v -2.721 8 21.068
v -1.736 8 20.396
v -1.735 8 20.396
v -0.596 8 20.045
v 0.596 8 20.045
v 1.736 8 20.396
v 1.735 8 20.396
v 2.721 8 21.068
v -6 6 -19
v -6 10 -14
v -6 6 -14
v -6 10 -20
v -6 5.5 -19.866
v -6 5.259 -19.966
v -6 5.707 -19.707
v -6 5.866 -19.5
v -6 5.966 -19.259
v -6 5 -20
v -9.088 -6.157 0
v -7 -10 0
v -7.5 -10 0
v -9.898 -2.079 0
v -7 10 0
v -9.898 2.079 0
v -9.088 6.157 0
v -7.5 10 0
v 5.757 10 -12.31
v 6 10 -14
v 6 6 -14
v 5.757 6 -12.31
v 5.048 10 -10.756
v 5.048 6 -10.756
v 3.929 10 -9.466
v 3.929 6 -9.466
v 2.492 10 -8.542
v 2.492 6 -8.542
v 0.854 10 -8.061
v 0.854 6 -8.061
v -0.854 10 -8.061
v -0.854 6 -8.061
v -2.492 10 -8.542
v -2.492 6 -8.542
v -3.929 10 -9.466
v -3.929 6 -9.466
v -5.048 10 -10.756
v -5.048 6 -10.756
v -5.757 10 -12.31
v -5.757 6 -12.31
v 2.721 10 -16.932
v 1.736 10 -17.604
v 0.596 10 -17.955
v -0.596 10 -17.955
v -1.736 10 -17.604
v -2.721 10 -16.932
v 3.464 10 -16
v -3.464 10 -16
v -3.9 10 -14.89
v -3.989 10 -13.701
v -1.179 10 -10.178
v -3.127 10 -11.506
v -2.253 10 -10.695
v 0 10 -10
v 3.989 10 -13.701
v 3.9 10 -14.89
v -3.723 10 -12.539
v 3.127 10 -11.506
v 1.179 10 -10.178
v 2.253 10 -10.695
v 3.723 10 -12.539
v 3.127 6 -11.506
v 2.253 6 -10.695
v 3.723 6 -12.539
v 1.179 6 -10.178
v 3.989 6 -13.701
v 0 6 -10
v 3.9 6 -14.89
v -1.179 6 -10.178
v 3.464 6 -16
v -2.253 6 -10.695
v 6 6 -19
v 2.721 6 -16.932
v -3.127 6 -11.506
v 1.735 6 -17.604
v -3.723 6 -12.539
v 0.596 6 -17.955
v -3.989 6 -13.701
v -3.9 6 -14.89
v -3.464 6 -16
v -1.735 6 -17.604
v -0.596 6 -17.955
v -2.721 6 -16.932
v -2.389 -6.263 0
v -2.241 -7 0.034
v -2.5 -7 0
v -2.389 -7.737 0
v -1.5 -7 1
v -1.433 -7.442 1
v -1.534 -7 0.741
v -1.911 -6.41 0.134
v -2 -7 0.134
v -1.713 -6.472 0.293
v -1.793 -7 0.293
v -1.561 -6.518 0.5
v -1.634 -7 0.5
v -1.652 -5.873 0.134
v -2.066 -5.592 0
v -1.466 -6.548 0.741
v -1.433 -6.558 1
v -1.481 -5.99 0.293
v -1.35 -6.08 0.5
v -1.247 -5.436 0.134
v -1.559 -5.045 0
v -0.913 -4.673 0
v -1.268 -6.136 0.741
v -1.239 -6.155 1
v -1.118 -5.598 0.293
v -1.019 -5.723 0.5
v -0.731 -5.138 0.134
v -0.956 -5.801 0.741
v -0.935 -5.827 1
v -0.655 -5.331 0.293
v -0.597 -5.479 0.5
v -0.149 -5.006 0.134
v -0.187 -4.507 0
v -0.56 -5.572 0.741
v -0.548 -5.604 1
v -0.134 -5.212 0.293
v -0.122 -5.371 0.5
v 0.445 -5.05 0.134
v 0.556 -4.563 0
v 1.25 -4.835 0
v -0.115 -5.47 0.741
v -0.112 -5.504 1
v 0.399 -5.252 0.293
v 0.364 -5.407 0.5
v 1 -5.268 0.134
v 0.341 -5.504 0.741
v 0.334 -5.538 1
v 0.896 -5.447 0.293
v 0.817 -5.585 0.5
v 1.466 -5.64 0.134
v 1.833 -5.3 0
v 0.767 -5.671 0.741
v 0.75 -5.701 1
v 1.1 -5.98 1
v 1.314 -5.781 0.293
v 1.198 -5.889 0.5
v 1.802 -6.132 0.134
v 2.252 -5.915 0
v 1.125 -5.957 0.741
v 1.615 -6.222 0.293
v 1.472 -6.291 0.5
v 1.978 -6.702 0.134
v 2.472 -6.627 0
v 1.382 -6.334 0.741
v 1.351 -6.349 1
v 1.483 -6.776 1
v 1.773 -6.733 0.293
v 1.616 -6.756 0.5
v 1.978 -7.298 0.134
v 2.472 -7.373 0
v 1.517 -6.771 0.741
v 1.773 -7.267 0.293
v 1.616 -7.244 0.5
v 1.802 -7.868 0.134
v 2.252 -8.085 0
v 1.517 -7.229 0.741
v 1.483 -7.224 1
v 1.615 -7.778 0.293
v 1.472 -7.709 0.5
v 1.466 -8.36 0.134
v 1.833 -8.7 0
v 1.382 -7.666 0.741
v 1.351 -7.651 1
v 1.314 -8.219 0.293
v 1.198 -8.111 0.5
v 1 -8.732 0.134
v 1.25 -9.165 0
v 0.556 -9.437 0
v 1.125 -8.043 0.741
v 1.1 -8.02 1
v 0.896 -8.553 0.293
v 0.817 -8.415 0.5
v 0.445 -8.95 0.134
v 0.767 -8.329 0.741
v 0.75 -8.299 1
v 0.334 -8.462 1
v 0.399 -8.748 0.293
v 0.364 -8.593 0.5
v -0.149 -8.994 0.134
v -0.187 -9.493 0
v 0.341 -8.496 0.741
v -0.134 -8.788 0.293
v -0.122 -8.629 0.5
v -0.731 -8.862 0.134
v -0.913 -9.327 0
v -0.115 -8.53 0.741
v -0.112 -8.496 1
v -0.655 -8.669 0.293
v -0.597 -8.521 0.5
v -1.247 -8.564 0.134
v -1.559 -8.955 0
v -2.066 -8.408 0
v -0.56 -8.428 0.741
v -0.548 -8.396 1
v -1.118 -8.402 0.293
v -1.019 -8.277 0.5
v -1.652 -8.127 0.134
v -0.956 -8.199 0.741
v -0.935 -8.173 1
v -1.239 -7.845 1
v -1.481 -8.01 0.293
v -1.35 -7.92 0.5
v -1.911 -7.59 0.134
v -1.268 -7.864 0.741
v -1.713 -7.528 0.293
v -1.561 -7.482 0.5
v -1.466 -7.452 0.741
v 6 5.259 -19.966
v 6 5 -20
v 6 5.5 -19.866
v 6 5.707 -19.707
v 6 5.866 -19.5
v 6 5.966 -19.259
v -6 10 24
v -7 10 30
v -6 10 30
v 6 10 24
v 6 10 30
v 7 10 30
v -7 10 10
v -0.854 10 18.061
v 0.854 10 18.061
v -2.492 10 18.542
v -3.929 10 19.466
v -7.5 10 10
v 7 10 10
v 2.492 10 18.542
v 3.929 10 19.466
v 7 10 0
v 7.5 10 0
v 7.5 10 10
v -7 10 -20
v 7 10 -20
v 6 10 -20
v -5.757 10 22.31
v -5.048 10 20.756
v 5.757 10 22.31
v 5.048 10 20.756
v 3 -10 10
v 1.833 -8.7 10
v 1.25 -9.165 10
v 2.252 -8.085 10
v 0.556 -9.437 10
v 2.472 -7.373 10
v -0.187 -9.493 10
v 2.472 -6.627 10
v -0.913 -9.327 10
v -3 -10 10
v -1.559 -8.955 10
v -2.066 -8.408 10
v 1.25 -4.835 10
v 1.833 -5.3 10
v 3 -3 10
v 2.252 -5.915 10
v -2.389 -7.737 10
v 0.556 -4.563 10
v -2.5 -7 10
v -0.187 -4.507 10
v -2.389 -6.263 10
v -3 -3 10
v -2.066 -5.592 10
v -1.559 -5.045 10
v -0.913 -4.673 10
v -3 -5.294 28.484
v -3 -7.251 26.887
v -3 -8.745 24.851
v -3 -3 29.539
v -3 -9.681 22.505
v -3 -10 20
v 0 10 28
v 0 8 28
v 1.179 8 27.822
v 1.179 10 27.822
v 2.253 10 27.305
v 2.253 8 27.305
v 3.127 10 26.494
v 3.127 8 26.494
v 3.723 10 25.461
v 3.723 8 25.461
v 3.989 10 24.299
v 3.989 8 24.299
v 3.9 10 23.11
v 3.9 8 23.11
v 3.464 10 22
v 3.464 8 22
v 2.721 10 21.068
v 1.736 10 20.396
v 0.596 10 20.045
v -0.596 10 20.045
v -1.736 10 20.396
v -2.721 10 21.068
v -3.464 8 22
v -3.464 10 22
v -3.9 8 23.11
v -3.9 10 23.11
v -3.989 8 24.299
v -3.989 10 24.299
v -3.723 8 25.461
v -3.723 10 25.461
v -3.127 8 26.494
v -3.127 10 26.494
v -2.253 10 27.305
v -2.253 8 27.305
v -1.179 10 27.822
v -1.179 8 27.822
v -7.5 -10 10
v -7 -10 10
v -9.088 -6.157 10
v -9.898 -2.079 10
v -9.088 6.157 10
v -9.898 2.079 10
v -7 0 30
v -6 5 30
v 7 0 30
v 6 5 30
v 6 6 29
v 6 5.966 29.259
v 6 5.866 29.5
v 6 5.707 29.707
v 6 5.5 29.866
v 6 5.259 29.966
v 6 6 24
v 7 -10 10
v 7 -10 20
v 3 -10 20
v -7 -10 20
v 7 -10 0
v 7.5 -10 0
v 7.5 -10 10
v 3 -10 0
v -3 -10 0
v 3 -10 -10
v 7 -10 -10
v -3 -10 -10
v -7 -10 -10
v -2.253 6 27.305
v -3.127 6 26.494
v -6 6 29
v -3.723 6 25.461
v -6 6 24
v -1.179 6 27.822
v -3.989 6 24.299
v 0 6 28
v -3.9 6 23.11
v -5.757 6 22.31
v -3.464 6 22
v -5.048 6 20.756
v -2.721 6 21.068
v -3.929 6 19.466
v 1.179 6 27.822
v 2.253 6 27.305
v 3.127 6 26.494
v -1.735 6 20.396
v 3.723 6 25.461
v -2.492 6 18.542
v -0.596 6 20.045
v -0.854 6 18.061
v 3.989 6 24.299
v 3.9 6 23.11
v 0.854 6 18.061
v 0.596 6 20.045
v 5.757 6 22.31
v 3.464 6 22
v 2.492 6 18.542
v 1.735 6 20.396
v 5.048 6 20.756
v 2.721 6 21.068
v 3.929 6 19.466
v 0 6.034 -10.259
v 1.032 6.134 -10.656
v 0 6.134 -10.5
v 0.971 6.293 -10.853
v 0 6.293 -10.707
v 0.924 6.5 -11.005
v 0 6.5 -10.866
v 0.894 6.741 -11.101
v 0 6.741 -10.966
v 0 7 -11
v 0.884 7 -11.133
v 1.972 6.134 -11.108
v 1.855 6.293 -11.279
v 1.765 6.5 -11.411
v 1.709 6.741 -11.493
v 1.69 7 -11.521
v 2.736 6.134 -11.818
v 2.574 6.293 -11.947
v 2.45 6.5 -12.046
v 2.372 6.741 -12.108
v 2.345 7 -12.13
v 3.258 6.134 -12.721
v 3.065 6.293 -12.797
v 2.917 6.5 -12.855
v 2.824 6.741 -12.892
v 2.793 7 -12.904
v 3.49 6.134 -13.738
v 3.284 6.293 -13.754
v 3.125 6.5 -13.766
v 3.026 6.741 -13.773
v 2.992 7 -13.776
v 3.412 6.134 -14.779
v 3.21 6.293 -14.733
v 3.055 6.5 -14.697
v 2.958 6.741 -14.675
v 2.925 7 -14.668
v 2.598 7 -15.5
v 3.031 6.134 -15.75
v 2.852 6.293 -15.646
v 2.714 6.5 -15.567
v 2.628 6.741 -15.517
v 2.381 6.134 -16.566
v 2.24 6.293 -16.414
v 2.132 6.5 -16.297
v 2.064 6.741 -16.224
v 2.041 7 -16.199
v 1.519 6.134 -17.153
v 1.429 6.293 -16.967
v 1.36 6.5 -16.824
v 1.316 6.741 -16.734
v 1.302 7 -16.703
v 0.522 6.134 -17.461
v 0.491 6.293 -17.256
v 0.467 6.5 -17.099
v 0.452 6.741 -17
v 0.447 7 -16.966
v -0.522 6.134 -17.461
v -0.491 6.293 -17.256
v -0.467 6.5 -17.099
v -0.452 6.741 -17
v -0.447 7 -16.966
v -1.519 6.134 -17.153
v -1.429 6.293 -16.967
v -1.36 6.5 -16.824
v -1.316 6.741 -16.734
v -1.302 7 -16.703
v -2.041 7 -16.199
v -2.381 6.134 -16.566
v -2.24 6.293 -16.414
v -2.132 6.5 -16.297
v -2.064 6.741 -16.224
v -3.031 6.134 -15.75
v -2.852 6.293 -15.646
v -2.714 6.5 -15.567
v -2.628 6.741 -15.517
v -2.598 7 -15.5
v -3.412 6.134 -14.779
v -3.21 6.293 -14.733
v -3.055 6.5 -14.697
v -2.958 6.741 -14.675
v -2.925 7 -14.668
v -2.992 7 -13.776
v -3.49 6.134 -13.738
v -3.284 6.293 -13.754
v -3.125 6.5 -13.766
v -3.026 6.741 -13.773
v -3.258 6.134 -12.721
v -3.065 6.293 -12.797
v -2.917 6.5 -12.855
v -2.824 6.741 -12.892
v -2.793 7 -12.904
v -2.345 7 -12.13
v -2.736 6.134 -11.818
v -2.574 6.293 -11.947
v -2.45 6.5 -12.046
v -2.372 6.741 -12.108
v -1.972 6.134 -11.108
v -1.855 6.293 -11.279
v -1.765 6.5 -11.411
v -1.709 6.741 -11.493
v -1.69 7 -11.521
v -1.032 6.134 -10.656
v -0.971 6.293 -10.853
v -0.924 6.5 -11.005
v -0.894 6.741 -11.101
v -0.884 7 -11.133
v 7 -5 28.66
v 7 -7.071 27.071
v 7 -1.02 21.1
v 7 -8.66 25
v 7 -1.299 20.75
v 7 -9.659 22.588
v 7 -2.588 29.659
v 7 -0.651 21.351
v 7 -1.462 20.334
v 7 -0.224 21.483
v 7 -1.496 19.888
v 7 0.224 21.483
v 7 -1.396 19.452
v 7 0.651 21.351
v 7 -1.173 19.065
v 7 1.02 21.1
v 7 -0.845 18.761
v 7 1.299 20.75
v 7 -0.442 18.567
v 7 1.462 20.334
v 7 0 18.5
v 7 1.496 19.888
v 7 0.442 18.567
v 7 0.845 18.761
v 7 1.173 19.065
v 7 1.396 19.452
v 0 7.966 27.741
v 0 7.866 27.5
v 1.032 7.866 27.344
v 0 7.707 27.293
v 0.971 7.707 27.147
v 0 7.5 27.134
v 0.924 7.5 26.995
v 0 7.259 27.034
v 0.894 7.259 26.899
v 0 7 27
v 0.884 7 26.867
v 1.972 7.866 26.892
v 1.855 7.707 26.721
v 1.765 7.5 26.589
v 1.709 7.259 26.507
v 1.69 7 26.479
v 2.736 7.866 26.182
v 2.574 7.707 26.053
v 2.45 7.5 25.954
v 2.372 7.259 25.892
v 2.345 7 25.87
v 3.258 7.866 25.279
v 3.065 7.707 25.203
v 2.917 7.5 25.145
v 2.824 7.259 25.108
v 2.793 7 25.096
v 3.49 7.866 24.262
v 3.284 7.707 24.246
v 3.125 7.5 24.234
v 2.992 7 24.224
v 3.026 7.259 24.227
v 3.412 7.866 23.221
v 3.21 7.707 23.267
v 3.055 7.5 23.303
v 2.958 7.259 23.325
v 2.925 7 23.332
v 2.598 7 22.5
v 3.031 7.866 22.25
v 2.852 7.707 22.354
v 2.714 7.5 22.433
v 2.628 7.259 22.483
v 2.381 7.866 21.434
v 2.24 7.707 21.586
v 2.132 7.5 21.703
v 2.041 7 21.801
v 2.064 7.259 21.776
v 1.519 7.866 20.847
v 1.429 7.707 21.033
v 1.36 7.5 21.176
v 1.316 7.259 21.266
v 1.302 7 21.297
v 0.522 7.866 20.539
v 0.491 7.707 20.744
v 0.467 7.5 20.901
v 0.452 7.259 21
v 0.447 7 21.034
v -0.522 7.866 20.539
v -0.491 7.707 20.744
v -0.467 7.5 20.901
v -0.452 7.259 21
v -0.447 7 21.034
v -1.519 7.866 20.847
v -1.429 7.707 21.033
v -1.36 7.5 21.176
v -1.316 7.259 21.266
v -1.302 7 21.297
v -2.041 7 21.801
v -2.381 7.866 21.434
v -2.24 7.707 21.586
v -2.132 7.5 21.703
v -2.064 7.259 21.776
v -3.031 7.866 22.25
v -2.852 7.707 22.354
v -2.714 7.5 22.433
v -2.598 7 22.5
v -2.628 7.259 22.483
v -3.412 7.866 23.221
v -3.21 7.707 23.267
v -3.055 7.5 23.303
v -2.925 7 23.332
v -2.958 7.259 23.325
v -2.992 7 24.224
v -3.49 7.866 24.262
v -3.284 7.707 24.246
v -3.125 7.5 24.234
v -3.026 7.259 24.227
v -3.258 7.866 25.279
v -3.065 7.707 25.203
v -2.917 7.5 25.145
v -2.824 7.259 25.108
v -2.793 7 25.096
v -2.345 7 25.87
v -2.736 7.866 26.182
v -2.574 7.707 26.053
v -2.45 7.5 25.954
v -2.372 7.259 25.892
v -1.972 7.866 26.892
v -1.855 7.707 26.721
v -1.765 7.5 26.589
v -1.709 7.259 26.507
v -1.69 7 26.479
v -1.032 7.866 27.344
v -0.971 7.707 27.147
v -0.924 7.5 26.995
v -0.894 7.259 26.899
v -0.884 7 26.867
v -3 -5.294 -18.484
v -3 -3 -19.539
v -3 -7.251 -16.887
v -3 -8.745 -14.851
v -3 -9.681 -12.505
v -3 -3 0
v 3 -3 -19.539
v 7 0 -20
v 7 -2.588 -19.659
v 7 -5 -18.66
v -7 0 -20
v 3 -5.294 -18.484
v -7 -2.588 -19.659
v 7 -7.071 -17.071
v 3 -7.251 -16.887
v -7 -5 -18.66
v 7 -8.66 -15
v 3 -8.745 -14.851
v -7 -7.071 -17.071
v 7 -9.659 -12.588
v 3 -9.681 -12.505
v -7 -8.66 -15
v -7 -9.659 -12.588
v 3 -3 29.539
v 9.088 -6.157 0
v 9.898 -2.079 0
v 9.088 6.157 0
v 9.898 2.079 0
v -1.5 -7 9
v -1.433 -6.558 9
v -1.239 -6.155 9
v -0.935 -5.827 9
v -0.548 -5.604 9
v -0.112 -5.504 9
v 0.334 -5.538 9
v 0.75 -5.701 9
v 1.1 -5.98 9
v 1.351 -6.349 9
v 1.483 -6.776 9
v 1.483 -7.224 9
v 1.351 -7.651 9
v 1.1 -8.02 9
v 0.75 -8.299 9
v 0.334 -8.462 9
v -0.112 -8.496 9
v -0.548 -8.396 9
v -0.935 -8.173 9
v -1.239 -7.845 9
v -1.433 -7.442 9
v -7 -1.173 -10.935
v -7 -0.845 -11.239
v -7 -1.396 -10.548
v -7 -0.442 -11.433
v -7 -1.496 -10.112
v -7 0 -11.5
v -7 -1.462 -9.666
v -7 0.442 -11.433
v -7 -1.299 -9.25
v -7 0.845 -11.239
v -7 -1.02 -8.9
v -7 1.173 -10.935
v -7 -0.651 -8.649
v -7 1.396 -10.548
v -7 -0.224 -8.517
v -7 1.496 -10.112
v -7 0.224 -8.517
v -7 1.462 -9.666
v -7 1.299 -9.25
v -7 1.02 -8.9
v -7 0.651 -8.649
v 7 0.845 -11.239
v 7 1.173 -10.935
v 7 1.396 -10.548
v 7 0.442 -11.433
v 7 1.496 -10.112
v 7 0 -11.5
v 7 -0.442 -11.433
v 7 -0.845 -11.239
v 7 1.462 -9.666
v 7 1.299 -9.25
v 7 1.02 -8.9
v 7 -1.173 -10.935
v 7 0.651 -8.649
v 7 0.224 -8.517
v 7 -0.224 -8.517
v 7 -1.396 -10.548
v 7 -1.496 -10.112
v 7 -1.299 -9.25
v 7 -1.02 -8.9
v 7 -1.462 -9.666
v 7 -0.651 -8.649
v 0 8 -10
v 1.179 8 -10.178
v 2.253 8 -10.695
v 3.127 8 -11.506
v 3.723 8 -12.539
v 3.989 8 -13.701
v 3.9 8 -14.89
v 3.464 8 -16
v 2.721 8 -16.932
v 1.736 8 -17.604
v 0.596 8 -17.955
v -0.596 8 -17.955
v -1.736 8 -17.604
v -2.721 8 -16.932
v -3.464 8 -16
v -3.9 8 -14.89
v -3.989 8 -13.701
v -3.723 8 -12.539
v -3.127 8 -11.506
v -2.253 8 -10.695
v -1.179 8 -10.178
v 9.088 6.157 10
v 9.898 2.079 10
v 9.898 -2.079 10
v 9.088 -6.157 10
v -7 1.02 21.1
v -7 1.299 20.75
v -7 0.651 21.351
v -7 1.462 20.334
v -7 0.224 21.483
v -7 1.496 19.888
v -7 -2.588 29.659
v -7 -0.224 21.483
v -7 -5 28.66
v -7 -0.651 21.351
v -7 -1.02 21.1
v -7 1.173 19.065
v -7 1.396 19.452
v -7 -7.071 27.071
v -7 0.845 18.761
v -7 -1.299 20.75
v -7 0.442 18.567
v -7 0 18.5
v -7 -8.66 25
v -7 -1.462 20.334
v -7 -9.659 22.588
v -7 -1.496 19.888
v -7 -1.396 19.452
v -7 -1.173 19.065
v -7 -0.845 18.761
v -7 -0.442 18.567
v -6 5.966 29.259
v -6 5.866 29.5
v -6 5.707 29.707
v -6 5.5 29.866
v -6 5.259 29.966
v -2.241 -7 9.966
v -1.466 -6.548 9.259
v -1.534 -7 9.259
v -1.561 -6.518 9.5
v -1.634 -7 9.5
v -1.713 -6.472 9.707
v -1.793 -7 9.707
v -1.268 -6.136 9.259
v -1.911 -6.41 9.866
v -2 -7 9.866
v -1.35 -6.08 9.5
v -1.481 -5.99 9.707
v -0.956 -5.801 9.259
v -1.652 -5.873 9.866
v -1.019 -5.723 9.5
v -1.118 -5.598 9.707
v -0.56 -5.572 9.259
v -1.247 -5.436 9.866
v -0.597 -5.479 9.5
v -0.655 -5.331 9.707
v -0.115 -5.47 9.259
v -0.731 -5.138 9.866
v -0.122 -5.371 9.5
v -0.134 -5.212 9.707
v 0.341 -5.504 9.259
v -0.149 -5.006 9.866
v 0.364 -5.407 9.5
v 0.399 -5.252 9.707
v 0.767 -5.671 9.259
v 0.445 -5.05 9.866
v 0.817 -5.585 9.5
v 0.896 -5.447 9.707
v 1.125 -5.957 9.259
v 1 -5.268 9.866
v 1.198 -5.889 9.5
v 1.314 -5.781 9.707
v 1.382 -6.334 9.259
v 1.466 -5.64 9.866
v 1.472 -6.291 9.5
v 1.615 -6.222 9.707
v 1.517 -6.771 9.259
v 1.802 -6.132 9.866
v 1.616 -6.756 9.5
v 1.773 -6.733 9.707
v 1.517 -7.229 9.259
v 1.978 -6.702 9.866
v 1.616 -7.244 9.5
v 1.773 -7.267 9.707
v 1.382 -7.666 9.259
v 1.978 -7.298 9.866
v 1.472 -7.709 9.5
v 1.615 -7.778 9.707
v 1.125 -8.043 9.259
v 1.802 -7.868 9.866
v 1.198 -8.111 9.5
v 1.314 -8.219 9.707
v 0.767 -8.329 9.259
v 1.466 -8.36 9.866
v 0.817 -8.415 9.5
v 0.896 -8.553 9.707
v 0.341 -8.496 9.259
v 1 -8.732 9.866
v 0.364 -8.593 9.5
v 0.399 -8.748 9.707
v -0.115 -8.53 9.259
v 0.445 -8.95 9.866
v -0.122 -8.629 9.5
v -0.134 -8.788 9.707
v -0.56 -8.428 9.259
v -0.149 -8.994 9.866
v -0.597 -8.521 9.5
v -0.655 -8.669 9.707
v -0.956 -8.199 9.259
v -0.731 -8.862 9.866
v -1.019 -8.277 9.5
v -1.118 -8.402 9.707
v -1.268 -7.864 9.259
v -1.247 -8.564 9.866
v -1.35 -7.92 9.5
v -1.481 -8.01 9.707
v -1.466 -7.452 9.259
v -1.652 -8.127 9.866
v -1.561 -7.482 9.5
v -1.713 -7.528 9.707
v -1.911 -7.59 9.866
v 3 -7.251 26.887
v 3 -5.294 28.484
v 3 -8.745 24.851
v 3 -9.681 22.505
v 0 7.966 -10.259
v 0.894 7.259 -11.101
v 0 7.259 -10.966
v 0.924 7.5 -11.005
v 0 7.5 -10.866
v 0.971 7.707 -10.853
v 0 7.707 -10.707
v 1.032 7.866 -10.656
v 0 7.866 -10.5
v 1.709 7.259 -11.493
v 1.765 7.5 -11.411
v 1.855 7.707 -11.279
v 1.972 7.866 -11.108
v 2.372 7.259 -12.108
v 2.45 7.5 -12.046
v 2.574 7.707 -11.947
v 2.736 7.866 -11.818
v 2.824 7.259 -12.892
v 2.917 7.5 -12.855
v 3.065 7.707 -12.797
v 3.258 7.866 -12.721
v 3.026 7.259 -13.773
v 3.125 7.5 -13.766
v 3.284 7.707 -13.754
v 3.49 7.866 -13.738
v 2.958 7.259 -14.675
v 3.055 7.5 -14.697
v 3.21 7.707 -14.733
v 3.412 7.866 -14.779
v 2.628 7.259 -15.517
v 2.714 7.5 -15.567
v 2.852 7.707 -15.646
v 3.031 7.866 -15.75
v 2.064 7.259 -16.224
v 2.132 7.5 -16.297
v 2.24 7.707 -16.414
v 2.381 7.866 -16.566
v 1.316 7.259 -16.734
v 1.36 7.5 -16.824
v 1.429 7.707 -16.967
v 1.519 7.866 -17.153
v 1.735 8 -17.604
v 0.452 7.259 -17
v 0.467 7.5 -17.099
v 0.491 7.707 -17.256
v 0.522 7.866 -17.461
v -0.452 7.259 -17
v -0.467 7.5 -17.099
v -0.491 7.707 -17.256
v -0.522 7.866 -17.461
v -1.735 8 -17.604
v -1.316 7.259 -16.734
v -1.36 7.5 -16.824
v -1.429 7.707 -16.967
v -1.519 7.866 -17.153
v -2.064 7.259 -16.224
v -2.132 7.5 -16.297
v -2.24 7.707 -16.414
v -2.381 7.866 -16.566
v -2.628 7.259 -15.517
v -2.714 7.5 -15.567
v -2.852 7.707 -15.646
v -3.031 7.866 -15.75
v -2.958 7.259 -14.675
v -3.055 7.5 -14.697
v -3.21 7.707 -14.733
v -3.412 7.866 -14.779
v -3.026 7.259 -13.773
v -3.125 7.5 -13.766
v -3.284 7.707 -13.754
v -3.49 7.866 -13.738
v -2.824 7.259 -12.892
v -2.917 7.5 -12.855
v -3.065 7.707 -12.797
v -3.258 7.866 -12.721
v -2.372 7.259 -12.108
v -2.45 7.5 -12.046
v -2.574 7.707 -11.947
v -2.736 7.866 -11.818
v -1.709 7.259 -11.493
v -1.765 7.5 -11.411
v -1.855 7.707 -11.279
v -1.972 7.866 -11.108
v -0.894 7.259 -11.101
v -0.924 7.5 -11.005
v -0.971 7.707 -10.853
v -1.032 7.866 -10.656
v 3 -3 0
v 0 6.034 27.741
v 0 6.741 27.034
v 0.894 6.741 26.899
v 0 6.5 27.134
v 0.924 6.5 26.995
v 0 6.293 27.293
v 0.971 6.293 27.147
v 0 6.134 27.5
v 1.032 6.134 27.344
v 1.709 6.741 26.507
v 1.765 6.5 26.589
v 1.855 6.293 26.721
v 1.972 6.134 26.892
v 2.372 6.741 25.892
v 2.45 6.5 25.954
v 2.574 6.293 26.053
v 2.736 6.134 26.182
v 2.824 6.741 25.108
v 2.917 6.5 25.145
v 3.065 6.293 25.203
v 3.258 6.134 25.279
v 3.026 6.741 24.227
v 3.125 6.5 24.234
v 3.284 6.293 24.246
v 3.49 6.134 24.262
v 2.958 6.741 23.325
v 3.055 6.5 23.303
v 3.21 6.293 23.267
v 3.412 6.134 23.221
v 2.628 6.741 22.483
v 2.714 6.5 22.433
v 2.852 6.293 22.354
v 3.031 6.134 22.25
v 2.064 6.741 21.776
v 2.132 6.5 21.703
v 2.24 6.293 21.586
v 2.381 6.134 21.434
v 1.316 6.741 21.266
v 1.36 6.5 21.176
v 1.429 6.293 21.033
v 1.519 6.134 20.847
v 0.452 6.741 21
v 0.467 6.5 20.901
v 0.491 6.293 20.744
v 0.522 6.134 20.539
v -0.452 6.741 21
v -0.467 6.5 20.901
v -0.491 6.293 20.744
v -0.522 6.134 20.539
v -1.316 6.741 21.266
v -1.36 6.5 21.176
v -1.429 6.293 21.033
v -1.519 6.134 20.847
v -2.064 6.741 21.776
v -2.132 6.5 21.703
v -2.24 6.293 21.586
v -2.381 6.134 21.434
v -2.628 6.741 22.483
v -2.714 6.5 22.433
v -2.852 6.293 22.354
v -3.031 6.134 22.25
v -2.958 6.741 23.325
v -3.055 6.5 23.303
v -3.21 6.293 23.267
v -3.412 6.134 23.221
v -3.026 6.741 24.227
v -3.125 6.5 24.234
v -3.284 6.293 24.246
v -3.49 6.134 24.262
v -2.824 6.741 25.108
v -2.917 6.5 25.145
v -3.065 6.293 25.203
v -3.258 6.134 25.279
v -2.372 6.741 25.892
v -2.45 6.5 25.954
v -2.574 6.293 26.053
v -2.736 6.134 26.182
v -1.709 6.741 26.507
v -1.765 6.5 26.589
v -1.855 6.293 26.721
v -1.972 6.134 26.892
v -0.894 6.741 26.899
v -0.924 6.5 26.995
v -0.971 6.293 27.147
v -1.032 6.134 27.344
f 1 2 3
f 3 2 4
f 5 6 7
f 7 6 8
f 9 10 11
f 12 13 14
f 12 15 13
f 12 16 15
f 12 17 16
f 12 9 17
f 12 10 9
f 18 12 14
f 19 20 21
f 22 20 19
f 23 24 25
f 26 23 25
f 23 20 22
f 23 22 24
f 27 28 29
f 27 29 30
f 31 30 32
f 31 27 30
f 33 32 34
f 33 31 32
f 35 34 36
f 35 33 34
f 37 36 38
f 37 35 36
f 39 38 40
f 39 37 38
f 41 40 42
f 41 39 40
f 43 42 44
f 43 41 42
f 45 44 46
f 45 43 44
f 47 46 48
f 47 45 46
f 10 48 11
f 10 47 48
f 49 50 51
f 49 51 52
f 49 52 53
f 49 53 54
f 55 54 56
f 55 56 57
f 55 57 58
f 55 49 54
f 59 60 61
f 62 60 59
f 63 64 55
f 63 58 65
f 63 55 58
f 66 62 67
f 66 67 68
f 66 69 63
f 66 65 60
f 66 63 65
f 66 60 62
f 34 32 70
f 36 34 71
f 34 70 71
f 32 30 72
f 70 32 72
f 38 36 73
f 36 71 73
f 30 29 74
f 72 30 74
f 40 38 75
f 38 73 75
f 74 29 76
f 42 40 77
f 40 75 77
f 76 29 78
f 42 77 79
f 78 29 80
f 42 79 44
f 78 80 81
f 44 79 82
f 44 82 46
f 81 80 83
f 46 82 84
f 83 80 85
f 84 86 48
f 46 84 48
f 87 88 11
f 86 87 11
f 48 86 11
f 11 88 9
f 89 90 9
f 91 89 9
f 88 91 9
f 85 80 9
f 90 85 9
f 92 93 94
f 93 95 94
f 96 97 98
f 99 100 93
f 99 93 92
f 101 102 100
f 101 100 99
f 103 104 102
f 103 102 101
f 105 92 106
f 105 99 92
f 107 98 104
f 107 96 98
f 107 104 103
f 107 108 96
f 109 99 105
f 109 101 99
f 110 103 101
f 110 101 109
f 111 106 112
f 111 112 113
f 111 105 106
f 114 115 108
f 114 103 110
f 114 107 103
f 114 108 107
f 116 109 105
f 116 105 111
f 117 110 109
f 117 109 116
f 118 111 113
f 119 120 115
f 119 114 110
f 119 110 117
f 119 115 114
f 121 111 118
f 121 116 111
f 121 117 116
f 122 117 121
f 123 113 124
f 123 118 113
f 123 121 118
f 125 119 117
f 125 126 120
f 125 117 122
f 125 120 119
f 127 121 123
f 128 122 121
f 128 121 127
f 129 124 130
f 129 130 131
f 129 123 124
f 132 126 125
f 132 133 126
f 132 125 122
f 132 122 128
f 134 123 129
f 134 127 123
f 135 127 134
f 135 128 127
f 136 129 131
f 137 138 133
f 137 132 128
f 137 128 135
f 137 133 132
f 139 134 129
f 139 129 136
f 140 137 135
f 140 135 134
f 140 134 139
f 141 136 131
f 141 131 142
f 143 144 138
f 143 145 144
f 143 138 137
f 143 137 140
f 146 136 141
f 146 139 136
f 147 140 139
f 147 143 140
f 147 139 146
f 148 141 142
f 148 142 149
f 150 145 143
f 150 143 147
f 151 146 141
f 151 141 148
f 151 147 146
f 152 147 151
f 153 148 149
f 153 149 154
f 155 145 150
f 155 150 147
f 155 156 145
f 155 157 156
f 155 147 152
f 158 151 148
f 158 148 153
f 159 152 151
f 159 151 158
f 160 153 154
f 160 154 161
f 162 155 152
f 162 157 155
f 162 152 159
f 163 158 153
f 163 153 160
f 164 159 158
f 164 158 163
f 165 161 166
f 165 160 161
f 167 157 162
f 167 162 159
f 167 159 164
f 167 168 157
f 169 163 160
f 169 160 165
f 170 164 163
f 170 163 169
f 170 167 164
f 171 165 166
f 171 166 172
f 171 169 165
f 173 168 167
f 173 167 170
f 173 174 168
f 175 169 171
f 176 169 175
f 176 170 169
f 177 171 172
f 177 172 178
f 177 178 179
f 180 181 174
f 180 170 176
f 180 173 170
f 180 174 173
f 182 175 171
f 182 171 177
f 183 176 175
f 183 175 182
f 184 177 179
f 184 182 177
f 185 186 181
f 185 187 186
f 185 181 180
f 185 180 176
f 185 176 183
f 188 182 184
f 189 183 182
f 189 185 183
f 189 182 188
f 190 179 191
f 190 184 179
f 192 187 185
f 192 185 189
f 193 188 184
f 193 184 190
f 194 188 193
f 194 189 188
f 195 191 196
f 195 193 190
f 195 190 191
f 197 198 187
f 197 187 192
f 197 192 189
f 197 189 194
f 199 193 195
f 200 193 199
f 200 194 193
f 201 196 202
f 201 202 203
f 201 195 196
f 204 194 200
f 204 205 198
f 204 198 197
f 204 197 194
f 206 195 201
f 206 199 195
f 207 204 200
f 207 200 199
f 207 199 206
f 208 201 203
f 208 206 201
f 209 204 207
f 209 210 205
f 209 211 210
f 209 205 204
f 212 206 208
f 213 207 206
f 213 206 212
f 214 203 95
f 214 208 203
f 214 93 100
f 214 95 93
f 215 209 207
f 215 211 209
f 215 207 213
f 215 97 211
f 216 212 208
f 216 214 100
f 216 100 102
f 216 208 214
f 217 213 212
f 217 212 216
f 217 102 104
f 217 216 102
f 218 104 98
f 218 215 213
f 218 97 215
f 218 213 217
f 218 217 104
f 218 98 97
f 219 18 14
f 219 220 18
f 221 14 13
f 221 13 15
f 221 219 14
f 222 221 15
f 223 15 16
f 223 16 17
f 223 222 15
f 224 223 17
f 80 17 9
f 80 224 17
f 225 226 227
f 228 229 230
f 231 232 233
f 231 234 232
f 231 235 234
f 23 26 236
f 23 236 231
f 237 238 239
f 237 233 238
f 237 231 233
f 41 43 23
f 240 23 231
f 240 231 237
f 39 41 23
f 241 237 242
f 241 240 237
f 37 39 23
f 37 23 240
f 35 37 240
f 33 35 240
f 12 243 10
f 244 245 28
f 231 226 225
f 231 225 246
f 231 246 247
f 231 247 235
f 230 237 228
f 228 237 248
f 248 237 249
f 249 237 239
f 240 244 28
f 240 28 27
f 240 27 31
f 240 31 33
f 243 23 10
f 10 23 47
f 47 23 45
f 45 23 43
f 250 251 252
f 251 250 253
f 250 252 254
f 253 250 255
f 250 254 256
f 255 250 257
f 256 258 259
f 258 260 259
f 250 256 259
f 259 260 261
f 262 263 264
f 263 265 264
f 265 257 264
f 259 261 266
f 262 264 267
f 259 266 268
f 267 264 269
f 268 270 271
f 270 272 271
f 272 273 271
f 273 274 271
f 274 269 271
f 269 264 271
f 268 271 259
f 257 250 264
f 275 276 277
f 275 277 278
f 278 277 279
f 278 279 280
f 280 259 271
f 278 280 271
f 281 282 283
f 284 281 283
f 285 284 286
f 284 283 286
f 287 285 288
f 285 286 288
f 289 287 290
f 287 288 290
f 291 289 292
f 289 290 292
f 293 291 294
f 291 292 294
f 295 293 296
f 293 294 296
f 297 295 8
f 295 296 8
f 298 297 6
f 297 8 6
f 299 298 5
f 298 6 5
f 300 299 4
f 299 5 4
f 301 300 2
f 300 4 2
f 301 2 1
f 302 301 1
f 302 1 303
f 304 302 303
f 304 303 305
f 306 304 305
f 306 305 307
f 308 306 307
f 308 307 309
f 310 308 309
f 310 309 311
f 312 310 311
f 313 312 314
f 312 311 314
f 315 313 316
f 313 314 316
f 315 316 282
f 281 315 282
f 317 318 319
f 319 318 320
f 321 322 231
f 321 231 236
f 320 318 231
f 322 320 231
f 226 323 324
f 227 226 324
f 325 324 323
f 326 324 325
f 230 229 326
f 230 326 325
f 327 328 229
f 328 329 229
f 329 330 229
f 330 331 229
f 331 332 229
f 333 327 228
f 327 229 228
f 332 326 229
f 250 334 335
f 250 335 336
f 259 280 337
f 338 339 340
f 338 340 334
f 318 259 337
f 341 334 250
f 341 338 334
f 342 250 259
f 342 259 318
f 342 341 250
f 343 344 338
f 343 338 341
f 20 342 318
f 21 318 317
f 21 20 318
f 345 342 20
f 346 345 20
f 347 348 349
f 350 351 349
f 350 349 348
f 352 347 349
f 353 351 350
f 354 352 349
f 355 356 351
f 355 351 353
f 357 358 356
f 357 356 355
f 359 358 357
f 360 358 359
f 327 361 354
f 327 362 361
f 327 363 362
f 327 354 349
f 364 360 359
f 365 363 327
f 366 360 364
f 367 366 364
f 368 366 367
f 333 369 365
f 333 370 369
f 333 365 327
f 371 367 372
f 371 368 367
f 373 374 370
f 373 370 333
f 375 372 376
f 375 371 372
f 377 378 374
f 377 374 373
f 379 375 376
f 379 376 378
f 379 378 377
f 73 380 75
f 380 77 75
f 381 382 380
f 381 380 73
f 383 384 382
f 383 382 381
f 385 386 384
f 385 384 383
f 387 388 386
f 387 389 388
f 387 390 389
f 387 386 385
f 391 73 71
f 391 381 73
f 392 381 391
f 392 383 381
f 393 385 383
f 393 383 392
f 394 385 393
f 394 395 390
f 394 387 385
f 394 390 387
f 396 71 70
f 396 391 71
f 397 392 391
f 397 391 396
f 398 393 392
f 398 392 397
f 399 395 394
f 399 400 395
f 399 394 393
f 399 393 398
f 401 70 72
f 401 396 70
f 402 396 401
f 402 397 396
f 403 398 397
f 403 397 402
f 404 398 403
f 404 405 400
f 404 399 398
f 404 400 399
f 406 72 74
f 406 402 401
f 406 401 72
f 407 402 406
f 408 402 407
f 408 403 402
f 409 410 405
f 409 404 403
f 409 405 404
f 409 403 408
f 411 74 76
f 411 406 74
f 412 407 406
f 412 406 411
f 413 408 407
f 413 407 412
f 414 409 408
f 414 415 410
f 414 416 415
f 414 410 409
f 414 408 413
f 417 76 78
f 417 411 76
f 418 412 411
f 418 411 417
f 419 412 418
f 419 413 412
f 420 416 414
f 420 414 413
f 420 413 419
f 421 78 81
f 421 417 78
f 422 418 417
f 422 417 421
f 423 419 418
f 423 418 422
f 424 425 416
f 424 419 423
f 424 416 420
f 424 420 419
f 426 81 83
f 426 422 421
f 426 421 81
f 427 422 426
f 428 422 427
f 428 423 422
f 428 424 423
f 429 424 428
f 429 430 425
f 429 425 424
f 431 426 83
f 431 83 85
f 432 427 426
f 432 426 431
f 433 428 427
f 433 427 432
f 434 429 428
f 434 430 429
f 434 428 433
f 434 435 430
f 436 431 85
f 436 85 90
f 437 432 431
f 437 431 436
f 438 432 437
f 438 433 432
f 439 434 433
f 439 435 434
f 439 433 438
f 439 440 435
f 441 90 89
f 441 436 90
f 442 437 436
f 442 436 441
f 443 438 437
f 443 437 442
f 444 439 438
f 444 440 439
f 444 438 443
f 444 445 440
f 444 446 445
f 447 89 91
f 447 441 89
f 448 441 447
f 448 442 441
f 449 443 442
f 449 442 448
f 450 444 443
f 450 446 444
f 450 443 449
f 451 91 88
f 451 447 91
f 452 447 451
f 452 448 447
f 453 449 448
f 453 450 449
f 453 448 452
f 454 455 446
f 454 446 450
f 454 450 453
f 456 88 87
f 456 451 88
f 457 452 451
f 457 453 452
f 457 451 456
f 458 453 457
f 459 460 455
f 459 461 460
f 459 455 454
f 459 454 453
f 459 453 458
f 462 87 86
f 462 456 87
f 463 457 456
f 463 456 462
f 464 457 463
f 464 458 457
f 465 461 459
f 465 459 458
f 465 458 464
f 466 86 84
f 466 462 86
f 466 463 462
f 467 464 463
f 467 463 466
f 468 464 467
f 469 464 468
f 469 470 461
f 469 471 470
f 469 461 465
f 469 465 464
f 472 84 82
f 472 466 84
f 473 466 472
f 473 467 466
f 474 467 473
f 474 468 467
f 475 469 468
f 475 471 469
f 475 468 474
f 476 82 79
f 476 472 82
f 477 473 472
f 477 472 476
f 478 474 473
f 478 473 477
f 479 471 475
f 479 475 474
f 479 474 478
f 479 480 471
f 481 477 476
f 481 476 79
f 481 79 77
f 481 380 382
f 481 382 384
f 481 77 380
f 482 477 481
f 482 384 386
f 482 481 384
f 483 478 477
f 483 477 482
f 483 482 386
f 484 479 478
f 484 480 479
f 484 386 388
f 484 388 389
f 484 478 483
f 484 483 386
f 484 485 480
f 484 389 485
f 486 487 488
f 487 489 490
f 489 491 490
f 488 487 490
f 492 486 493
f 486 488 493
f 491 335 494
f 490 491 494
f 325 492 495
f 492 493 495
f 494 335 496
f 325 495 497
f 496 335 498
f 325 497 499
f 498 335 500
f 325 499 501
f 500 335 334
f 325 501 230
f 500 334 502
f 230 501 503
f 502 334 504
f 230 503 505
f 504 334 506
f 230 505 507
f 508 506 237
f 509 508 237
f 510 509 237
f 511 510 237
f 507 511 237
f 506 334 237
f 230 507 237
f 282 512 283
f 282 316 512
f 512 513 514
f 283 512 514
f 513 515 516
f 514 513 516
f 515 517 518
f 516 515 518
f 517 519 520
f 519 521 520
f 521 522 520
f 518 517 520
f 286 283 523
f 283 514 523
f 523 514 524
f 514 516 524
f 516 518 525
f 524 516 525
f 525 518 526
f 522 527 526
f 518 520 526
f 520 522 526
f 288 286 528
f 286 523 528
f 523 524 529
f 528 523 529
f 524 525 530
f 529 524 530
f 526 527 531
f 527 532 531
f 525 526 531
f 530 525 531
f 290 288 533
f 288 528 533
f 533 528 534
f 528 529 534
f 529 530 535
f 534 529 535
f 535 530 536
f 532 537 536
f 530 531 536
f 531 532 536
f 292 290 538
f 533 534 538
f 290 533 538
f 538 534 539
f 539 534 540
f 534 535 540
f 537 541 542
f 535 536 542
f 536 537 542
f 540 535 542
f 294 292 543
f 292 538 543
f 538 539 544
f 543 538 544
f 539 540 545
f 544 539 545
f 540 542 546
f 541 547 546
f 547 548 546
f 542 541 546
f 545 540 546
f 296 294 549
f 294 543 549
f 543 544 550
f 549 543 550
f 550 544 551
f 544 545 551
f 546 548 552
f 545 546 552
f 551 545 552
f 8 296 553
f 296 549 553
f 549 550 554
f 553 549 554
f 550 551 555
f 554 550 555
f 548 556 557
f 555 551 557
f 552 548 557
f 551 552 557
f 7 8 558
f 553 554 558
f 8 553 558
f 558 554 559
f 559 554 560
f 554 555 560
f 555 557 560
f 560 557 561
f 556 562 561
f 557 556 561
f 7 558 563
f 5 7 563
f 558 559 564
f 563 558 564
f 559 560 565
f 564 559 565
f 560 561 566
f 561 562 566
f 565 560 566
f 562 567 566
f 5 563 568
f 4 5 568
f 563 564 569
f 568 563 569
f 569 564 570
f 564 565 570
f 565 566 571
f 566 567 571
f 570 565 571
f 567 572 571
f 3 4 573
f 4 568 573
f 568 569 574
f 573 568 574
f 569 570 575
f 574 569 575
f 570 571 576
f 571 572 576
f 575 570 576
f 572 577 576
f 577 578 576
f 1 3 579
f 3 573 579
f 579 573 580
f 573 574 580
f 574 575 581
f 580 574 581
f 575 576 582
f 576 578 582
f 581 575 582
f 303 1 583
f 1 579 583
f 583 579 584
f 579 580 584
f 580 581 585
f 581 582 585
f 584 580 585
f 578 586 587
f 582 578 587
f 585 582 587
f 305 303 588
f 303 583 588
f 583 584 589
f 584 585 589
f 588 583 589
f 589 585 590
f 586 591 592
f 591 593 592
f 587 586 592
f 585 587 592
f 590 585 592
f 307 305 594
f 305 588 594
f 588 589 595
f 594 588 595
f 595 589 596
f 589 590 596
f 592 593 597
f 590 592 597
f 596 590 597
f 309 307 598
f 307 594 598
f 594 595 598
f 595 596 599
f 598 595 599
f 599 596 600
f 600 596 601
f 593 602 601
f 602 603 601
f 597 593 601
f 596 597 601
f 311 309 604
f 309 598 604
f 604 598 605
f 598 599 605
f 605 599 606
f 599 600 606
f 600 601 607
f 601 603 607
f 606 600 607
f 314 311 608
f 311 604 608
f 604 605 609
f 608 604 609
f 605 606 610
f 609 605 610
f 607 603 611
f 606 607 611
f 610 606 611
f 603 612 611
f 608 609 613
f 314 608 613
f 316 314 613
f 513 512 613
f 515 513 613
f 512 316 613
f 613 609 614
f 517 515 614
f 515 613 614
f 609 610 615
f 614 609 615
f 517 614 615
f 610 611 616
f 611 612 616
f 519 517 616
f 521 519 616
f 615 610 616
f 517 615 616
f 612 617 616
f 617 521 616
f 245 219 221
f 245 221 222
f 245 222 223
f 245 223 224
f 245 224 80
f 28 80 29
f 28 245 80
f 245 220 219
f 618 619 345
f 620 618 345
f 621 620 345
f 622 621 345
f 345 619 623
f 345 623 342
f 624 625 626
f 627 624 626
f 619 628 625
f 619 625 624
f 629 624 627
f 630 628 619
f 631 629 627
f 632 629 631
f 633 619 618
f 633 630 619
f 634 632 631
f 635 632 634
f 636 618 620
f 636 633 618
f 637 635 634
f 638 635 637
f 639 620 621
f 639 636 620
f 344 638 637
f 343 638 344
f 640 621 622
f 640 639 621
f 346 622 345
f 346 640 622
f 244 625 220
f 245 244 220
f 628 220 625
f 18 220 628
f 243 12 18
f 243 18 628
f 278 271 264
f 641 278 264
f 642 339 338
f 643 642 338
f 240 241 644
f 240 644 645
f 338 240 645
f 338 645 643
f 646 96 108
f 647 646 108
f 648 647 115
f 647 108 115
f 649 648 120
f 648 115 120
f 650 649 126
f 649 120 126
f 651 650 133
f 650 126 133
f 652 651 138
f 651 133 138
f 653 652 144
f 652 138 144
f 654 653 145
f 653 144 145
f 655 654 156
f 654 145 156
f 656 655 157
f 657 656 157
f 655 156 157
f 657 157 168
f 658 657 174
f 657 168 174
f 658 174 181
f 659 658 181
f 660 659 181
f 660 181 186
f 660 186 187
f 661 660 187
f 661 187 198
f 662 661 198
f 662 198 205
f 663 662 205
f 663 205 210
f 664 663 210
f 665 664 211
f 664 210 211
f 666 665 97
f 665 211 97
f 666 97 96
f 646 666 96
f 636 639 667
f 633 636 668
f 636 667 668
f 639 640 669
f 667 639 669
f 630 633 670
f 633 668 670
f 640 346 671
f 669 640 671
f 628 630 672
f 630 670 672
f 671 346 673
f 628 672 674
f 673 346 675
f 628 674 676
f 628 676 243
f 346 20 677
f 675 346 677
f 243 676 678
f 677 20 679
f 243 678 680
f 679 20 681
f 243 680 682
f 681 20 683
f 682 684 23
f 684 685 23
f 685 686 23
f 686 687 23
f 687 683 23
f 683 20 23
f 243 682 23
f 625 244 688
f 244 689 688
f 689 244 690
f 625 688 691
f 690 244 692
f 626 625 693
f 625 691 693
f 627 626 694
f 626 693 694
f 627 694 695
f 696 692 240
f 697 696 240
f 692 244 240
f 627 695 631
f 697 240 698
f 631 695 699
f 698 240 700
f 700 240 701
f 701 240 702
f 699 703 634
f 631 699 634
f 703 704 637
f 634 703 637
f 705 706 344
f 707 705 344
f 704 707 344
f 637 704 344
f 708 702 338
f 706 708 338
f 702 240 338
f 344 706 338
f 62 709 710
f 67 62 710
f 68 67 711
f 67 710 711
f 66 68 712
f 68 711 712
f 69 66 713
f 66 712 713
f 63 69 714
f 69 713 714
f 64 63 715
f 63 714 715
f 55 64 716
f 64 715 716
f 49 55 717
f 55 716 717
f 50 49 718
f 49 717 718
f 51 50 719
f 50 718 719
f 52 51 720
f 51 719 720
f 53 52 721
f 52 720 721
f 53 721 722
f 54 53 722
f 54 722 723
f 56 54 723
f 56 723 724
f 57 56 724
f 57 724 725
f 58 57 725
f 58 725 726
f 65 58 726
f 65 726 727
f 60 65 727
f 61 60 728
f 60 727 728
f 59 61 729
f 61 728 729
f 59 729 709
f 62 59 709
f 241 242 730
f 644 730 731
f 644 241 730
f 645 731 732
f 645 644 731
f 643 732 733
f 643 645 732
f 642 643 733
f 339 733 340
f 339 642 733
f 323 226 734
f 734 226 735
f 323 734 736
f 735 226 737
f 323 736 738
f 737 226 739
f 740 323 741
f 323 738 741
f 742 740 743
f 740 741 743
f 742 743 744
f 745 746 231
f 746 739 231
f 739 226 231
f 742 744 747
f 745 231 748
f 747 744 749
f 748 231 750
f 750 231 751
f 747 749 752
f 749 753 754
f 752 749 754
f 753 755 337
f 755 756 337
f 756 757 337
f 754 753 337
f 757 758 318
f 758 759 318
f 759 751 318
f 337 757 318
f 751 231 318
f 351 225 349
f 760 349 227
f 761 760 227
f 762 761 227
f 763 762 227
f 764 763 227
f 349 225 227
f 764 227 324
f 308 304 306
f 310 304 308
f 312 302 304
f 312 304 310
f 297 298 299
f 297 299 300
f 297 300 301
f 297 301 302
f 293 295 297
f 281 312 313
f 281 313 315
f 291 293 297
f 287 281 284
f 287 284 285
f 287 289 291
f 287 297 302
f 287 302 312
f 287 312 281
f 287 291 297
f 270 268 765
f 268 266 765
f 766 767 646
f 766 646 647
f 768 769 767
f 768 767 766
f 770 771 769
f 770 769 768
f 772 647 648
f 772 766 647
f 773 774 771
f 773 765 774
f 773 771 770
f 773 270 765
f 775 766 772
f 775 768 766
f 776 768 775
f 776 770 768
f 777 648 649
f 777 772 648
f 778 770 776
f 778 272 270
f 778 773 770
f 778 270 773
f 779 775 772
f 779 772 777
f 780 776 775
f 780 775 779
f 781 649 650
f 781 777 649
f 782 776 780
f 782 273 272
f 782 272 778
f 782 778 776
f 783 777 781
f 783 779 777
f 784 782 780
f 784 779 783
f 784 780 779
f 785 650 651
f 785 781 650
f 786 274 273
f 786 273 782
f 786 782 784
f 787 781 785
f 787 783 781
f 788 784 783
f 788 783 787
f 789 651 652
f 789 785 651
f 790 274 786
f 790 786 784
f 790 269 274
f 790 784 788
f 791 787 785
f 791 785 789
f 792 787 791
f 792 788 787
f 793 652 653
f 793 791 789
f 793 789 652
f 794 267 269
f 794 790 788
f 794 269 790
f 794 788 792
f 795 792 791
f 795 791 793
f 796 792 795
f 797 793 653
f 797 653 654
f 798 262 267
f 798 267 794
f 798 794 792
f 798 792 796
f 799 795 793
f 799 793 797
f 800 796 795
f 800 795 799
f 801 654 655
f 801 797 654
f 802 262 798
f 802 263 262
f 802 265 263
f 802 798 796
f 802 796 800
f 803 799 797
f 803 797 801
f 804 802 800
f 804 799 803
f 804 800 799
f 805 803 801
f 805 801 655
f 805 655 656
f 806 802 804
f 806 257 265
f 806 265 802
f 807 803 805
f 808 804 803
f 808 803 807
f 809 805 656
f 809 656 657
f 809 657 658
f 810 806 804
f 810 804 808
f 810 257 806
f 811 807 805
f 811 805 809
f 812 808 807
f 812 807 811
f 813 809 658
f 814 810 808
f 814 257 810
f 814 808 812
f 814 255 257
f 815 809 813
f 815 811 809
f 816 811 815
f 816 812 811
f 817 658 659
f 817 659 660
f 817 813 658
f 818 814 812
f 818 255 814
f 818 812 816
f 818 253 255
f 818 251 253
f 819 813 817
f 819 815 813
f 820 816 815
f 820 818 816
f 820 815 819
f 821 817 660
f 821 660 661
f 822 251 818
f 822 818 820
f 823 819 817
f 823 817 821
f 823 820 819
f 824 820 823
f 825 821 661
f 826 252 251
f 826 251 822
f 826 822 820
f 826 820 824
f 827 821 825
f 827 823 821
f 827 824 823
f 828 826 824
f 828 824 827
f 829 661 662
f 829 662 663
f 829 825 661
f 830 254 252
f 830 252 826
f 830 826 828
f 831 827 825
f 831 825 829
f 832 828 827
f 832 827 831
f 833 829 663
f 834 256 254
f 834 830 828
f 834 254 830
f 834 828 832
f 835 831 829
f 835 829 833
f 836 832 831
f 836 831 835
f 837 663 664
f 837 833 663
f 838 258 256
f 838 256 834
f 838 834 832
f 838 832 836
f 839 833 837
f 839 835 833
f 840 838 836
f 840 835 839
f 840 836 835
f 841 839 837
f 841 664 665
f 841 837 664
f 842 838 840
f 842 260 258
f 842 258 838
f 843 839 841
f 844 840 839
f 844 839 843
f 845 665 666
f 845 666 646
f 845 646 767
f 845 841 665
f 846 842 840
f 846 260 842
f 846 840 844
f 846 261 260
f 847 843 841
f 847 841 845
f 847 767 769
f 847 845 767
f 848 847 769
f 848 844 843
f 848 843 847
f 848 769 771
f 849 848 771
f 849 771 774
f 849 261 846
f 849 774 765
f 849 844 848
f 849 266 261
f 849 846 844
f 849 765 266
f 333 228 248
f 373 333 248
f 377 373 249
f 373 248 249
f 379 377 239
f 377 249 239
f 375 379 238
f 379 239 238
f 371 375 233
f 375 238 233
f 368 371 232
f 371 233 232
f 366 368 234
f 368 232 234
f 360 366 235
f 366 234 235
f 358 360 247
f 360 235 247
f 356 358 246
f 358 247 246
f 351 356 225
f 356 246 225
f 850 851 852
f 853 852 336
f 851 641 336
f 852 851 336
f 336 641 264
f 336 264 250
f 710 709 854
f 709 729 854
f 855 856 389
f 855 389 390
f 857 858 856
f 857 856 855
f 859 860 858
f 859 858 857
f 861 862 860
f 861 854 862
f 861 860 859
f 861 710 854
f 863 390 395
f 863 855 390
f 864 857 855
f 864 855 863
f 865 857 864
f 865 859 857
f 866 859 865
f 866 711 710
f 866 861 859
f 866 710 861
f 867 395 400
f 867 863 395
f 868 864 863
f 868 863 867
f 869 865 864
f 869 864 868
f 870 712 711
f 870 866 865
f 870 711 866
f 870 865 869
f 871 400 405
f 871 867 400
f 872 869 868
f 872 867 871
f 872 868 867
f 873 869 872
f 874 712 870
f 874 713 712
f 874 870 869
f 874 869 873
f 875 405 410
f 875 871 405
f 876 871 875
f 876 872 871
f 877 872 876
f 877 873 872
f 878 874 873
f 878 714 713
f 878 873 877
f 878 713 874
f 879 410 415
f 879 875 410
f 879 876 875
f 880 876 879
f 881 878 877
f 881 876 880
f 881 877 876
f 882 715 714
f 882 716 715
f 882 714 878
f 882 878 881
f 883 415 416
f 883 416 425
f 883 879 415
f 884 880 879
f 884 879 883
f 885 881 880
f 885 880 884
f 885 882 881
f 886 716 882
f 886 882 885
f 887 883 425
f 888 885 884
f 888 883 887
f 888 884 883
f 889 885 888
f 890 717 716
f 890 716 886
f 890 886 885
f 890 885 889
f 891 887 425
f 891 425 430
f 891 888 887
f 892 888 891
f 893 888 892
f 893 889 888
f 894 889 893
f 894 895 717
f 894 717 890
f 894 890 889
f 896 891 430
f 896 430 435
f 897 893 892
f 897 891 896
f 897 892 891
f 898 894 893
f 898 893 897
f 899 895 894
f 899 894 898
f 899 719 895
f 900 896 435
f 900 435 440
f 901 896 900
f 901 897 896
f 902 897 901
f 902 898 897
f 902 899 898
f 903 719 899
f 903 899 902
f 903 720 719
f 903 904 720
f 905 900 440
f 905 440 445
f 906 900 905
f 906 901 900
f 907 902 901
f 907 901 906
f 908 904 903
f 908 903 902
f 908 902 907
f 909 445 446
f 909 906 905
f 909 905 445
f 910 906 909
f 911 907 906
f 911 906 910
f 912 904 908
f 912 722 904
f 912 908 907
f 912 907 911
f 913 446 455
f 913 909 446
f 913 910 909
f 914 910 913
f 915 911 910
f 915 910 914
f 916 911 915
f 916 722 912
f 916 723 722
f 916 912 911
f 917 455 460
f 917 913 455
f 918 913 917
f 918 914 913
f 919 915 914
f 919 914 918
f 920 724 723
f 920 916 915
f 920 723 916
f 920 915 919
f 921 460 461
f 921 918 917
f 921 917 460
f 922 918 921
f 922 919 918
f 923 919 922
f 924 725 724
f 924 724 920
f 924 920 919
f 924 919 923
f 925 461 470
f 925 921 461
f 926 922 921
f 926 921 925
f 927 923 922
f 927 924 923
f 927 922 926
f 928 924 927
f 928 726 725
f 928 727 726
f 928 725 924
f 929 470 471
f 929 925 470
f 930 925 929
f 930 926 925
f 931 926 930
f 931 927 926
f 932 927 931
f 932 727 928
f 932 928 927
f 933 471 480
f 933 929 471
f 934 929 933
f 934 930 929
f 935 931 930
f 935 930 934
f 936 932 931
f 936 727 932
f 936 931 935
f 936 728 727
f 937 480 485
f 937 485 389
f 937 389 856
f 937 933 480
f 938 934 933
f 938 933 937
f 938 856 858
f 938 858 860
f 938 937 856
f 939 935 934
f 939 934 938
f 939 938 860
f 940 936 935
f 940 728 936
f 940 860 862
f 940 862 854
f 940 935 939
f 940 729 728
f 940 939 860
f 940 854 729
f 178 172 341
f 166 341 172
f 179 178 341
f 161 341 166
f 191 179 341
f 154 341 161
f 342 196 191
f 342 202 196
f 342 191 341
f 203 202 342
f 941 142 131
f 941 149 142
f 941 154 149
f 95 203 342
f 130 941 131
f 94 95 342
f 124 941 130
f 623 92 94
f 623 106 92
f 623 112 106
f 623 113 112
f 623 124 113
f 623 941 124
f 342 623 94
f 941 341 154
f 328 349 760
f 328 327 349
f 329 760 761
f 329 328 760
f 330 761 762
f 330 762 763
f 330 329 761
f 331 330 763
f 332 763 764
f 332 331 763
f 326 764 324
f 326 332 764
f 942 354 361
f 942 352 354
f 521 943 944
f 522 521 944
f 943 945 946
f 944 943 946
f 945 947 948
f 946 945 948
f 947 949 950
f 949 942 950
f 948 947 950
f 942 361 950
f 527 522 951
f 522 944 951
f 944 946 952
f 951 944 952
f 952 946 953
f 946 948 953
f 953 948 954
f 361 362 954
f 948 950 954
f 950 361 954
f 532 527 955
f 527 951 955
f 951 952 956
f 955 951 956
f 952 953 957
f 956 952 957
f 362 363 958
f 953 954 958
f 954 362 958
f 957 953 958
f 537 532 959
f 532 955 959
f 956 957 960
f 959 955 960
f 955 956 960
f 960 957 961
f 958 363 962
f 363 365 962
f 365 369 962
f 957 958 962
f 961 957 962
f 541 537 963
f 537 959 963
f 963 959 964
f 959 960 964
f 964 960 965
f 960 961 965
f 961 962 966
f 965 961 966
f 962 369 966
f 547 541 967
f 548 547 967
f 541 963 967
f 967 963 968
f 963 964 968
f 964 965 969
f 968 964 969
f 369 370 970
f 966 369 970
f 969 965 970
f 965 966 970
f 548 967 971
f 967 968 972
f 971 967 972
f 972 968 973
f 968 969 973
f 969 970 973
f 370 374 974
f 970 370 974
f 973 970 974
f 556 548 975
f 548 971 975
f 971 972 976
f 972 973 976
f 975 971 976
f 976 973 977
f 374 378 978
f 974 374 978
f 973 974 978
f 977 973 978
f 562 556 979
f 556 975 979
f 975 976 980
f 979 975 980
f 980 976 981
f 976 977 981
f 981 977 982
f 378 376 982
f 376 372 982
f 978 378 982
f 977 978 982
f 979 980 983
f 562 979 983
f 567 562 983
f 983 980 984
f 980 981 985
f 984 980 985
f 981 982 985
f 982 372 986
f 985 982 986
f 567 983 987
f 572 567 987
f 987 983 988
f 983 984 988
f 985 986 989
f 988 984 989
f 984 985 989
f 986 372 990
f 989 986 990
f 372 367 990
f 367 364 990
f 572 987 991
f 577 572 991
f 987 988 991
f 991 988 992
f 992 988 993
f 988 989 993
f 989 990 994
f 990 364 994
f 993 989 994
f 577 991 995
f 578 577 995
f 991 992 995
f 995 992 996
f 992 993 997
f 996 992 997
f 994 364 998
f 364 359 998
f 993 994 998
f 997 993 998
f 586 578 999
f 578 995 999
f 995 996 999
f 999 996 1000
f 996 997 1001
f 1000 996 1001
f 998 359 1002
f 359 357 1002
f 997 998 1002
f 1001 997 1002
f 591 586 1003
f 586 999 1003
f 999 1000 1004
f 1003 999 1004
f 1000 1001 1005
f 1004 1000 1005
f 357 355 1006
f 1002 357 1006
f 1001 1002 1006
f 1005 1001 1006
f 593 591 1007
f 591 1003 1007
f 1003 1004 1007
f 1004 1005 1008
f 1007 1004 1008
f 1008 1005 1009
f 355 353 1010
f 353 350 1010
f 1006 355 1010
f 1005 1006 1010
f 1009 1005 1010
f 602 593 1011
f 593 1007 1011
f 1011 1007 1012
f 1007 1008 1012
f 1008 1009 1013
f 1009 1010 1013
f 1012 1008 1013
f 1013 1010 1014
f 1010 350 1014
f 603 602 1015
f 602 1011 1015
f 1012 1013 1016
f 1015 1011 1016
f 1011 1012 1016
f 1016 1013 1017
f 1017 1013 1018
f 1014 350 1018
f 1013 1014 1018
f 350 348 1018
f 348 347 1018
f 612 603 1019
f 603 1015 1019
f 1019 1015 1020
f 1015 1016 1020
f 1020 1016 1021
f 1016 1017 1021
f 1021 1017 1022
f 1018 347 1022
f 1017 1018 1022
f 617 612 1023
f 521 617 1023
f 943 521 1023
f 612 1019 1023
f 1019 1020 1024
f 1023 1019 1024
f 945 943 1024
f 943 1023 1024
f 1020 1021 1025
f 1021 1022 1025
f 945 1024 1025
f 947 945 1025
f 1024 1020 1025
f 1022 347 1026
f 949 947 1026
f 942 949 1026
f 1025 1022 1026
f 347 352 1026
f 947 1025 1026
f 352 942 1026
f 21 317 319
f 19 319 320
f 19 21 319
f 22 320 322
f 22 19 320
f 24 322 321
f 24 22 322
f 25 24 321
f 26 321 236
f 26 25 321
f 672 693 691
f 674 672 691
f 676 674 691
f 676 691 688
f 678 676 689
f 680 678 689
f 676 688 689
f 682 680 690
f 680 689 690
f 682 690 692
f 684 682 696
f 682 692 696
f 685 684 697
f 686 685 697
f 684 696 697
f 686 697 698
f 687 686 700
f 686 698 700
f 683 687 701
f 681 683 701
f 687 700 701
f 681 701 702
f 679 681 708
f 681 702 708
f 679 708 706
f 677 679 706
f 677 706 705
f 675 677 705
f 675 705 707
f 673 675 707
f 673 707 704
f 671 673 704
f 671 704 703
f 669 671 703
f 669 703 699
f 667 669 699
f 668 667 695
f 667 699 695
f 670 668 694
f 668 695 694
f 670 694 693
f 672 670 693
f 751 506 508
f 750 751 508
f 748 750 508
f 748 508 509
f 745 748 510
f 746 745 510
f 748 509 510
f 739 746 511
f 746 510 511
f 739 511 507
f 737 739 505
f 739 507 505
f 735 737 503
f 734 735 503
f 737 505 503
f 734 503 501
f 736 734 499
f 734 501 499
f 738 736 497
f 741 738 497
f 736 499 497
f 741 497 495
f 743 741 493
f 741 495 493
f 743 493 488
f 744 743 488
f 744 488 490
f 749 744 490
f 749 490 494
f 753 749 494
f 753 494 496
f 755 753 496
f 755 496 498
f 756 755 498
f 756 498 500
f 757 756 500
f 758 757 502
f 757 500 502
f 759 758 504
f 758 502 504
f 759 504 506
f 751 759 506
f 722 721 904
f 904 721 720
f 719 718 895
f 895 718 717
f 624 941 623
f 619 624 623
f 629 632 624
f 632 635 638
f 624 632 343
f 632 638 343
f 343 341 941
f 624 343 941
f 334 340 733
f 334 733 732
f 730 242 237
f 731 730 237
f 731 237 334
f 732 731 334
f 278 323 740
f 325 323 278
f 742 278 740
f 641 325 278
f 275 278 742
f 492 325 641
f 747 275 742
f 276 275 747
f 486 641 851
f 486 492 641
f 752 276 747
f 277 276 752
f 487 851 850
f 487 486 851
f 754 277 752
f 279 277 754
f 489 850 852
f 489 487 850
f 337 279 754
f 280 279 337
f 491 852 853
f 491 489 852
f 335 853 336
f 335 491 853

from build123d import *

# Parameters (mm, degrees)
SALIENTE_EXTRUIR1_DEPTH = 10
CROQUIS3_R              = 1.5
CORTAR_EXTRUIR1_DEPTH   = 10
SALIENTE_EXTRUIR2_DEPTH = 20
SALIENTE_EXTRUIR3_DEPTH = 20
CROQUIS6_R              = 1.5
CORTAR_EXTRUIR2_DEPTH   = 14
REDONDEO1_R             = 10
CUT_EXTRUDE1_DEPTH      = 4
SKETCH2_R               = 3
BOSS_EXTRUDE1_DEPTH     = 2
SKETCH3_R               = 4
BOSS_EXTRUDE2_DEPTH     = 2
FILLET1_R               = 1
FILLET2_R               = 1
FILLET3_R               = 1


with BuildPart() as part:
    # Croquis2 → Saliente-Extruir1 (new body)
    with BuildSketch(Plane.XY):
        with BuildLine():
            Line((-7.5, 10), (7.5, 10))
            ThreePointArc((7.5, 10), (10, 0), (7.5, -10))
            Line((7.5, -10), (-7.5, -10))
            ThreePointArc((-7.5, -10), (-10, 0), (-7.5, 10))
        make_face()
    extrude(amount=SALIENTE_EXTRUIR1_DEPTH)

    # Croquis3 → Cortar-Extruir1 (cut)
    with BuildSketch(Plane(origin=(0, 0, 0), x_dir=(-1, 0, 0), z_dir=(0, 0, -1))):
        with Locations((0, -7)):
            Circle(CROQUIS3_R)
    extrude(amount=-CORTAR_EXTRUIR1_DEPTH, mode=Mode.SUBTRACT)

    # Croquis4 → Saliente-Extruir2 (add)
    with BuildSketch(Plane(origin=(0, 0, 0), x_dir=(-1, 0, 0), z_dir=(0, 0, -1))):
        Polygon((-7, 10), (-7, -10), (-3, -10), (-3, -3), (3, -3), (3, -10), (7, -10), (7, 10), align=None)
    extrude(amount=SALIENTE_EXTRUIR2_DEPTH)

    # Croquis5 → Saliente-Extruir3 (add)
    with BuildSketch(Plane.XY.offset(10)):
        Polygon((-7, 10), (-7, -10), (-3, -10), (-3, -3), (3, -3), (3, -10), (7, -10), (7, 10), align=None)
    extrude(amount=SALIENTE_EXTRUIR3_DEPTH)

    # Croquis6 → Cortar-Extruir2 (cut)
    with BuildSketch(Plane(origin=(7, 0, 0), x_dir=(0, 0, -1), z_dir=(1, 0, 0))):
        with Locations((-20, 0)):
            Circle(CROQUIS6_R)
        with Locations((10, 0)):
            Circle(CROQUIS6_R)
    extrude(amount=-CORTAR_EXTRUIR2_DEPTH, mode=Mode.SUBTRACT)

    # Redondeo1
    redondeo1_edges = [part.edges().sort_by_distance(p)[0] for p in [
        (-5, -10, 30),
        (-5, -10, -20),
    ]]
    fillet(redondeo1_edges, radius=REDONDEO1_R)

    # Sketch1 → Cut-Extrude1 (cut)
    with BuildSketch(Plane(origin=(0, 10, 0), x_dir=(1, 0, 0), z_dir=(0, 1, 0))):
        with BuildLine():
            Line((-6, 14), (-6, 20))
            Line((-6, 20), (6, 20))
            Line((6, 20), (6, 14))
            ThreePointArc((6, 14), (0, 8), (-6, 14))
        make_face()
        with BuildLine():
            Line((-6, -24), (-6, -30))
            Line((-6, -30), (6, -30))
            Line((6, -30), (6, -24))
            ThreePointArc((6, -24), (0, -18), (-6, -24))
        make_face()
    extrude(amount=-CUT_EXTRUDE1_DEPTH, mode=Mode.SUBTRACT)

    # Sketch2 → Boss-Extrude1 (add)
    with BuildSketch(Plane(origin=(0, 6, 0), x_dir=(1, 0, 0), z_dir=(0, 1, 0))):
        with Locations(Location((0, 14, 0), (0, 0, 270))):
            Circle(SKETCH2_R)
        with Locations(Location((0, -24, 0), (0, 0, 270))):
            Circle(SKETCH2_R)
    extrude(amount=BOSS_EXTRUDE1_DEPTH)

    # Sketch3 → Boss-Extrude2 (add)
    with BuildSketch(Plane(origin=(0, 8, 0), x_dir=(1, 0, 0), z_dir=(0, 1, 0))):
        with Locations(Location((0, -24, 0), (0, 0, 270))):
            Circle(SKETCH3_R)
        with Locations(Location((0, 14, 0), (0, 0, 270))):
            Circle(SKETCH3_R)
    extrude(amount=BOSS_EXTRUDE2_DEPTH)

    # Fillet1
    fillet1_edges = [part.edges().sort_by_distance(p)[0] for p in [
        (0, 6, -17),
        (0, 8, -17),
        (0, 6, 21),
        (0, 8, 21),
    ]]
    fillet(fillet1_edges, radius=FILLET1_R - 0.0001)  # a hair under: the kernel refuses the full size

    # Fillet2
    fillet2_edges = [part.edges().sort_by_distance(p)[0] for p in [
        (0, 6, -20),
        (0, 6, 30),
    ]]
    fillet(fillet2_edges, radius=FILLET2_R)

    # Fillet3
    fillet3_edges = [part.edges().sort_by_distance(p)[0] for p in [
        (1.5, -7, 10),
        (1.5, -7, 0),
    ]]
    fillet(fillet3_edges, radius=FILLET3_R)


solid = part.part
